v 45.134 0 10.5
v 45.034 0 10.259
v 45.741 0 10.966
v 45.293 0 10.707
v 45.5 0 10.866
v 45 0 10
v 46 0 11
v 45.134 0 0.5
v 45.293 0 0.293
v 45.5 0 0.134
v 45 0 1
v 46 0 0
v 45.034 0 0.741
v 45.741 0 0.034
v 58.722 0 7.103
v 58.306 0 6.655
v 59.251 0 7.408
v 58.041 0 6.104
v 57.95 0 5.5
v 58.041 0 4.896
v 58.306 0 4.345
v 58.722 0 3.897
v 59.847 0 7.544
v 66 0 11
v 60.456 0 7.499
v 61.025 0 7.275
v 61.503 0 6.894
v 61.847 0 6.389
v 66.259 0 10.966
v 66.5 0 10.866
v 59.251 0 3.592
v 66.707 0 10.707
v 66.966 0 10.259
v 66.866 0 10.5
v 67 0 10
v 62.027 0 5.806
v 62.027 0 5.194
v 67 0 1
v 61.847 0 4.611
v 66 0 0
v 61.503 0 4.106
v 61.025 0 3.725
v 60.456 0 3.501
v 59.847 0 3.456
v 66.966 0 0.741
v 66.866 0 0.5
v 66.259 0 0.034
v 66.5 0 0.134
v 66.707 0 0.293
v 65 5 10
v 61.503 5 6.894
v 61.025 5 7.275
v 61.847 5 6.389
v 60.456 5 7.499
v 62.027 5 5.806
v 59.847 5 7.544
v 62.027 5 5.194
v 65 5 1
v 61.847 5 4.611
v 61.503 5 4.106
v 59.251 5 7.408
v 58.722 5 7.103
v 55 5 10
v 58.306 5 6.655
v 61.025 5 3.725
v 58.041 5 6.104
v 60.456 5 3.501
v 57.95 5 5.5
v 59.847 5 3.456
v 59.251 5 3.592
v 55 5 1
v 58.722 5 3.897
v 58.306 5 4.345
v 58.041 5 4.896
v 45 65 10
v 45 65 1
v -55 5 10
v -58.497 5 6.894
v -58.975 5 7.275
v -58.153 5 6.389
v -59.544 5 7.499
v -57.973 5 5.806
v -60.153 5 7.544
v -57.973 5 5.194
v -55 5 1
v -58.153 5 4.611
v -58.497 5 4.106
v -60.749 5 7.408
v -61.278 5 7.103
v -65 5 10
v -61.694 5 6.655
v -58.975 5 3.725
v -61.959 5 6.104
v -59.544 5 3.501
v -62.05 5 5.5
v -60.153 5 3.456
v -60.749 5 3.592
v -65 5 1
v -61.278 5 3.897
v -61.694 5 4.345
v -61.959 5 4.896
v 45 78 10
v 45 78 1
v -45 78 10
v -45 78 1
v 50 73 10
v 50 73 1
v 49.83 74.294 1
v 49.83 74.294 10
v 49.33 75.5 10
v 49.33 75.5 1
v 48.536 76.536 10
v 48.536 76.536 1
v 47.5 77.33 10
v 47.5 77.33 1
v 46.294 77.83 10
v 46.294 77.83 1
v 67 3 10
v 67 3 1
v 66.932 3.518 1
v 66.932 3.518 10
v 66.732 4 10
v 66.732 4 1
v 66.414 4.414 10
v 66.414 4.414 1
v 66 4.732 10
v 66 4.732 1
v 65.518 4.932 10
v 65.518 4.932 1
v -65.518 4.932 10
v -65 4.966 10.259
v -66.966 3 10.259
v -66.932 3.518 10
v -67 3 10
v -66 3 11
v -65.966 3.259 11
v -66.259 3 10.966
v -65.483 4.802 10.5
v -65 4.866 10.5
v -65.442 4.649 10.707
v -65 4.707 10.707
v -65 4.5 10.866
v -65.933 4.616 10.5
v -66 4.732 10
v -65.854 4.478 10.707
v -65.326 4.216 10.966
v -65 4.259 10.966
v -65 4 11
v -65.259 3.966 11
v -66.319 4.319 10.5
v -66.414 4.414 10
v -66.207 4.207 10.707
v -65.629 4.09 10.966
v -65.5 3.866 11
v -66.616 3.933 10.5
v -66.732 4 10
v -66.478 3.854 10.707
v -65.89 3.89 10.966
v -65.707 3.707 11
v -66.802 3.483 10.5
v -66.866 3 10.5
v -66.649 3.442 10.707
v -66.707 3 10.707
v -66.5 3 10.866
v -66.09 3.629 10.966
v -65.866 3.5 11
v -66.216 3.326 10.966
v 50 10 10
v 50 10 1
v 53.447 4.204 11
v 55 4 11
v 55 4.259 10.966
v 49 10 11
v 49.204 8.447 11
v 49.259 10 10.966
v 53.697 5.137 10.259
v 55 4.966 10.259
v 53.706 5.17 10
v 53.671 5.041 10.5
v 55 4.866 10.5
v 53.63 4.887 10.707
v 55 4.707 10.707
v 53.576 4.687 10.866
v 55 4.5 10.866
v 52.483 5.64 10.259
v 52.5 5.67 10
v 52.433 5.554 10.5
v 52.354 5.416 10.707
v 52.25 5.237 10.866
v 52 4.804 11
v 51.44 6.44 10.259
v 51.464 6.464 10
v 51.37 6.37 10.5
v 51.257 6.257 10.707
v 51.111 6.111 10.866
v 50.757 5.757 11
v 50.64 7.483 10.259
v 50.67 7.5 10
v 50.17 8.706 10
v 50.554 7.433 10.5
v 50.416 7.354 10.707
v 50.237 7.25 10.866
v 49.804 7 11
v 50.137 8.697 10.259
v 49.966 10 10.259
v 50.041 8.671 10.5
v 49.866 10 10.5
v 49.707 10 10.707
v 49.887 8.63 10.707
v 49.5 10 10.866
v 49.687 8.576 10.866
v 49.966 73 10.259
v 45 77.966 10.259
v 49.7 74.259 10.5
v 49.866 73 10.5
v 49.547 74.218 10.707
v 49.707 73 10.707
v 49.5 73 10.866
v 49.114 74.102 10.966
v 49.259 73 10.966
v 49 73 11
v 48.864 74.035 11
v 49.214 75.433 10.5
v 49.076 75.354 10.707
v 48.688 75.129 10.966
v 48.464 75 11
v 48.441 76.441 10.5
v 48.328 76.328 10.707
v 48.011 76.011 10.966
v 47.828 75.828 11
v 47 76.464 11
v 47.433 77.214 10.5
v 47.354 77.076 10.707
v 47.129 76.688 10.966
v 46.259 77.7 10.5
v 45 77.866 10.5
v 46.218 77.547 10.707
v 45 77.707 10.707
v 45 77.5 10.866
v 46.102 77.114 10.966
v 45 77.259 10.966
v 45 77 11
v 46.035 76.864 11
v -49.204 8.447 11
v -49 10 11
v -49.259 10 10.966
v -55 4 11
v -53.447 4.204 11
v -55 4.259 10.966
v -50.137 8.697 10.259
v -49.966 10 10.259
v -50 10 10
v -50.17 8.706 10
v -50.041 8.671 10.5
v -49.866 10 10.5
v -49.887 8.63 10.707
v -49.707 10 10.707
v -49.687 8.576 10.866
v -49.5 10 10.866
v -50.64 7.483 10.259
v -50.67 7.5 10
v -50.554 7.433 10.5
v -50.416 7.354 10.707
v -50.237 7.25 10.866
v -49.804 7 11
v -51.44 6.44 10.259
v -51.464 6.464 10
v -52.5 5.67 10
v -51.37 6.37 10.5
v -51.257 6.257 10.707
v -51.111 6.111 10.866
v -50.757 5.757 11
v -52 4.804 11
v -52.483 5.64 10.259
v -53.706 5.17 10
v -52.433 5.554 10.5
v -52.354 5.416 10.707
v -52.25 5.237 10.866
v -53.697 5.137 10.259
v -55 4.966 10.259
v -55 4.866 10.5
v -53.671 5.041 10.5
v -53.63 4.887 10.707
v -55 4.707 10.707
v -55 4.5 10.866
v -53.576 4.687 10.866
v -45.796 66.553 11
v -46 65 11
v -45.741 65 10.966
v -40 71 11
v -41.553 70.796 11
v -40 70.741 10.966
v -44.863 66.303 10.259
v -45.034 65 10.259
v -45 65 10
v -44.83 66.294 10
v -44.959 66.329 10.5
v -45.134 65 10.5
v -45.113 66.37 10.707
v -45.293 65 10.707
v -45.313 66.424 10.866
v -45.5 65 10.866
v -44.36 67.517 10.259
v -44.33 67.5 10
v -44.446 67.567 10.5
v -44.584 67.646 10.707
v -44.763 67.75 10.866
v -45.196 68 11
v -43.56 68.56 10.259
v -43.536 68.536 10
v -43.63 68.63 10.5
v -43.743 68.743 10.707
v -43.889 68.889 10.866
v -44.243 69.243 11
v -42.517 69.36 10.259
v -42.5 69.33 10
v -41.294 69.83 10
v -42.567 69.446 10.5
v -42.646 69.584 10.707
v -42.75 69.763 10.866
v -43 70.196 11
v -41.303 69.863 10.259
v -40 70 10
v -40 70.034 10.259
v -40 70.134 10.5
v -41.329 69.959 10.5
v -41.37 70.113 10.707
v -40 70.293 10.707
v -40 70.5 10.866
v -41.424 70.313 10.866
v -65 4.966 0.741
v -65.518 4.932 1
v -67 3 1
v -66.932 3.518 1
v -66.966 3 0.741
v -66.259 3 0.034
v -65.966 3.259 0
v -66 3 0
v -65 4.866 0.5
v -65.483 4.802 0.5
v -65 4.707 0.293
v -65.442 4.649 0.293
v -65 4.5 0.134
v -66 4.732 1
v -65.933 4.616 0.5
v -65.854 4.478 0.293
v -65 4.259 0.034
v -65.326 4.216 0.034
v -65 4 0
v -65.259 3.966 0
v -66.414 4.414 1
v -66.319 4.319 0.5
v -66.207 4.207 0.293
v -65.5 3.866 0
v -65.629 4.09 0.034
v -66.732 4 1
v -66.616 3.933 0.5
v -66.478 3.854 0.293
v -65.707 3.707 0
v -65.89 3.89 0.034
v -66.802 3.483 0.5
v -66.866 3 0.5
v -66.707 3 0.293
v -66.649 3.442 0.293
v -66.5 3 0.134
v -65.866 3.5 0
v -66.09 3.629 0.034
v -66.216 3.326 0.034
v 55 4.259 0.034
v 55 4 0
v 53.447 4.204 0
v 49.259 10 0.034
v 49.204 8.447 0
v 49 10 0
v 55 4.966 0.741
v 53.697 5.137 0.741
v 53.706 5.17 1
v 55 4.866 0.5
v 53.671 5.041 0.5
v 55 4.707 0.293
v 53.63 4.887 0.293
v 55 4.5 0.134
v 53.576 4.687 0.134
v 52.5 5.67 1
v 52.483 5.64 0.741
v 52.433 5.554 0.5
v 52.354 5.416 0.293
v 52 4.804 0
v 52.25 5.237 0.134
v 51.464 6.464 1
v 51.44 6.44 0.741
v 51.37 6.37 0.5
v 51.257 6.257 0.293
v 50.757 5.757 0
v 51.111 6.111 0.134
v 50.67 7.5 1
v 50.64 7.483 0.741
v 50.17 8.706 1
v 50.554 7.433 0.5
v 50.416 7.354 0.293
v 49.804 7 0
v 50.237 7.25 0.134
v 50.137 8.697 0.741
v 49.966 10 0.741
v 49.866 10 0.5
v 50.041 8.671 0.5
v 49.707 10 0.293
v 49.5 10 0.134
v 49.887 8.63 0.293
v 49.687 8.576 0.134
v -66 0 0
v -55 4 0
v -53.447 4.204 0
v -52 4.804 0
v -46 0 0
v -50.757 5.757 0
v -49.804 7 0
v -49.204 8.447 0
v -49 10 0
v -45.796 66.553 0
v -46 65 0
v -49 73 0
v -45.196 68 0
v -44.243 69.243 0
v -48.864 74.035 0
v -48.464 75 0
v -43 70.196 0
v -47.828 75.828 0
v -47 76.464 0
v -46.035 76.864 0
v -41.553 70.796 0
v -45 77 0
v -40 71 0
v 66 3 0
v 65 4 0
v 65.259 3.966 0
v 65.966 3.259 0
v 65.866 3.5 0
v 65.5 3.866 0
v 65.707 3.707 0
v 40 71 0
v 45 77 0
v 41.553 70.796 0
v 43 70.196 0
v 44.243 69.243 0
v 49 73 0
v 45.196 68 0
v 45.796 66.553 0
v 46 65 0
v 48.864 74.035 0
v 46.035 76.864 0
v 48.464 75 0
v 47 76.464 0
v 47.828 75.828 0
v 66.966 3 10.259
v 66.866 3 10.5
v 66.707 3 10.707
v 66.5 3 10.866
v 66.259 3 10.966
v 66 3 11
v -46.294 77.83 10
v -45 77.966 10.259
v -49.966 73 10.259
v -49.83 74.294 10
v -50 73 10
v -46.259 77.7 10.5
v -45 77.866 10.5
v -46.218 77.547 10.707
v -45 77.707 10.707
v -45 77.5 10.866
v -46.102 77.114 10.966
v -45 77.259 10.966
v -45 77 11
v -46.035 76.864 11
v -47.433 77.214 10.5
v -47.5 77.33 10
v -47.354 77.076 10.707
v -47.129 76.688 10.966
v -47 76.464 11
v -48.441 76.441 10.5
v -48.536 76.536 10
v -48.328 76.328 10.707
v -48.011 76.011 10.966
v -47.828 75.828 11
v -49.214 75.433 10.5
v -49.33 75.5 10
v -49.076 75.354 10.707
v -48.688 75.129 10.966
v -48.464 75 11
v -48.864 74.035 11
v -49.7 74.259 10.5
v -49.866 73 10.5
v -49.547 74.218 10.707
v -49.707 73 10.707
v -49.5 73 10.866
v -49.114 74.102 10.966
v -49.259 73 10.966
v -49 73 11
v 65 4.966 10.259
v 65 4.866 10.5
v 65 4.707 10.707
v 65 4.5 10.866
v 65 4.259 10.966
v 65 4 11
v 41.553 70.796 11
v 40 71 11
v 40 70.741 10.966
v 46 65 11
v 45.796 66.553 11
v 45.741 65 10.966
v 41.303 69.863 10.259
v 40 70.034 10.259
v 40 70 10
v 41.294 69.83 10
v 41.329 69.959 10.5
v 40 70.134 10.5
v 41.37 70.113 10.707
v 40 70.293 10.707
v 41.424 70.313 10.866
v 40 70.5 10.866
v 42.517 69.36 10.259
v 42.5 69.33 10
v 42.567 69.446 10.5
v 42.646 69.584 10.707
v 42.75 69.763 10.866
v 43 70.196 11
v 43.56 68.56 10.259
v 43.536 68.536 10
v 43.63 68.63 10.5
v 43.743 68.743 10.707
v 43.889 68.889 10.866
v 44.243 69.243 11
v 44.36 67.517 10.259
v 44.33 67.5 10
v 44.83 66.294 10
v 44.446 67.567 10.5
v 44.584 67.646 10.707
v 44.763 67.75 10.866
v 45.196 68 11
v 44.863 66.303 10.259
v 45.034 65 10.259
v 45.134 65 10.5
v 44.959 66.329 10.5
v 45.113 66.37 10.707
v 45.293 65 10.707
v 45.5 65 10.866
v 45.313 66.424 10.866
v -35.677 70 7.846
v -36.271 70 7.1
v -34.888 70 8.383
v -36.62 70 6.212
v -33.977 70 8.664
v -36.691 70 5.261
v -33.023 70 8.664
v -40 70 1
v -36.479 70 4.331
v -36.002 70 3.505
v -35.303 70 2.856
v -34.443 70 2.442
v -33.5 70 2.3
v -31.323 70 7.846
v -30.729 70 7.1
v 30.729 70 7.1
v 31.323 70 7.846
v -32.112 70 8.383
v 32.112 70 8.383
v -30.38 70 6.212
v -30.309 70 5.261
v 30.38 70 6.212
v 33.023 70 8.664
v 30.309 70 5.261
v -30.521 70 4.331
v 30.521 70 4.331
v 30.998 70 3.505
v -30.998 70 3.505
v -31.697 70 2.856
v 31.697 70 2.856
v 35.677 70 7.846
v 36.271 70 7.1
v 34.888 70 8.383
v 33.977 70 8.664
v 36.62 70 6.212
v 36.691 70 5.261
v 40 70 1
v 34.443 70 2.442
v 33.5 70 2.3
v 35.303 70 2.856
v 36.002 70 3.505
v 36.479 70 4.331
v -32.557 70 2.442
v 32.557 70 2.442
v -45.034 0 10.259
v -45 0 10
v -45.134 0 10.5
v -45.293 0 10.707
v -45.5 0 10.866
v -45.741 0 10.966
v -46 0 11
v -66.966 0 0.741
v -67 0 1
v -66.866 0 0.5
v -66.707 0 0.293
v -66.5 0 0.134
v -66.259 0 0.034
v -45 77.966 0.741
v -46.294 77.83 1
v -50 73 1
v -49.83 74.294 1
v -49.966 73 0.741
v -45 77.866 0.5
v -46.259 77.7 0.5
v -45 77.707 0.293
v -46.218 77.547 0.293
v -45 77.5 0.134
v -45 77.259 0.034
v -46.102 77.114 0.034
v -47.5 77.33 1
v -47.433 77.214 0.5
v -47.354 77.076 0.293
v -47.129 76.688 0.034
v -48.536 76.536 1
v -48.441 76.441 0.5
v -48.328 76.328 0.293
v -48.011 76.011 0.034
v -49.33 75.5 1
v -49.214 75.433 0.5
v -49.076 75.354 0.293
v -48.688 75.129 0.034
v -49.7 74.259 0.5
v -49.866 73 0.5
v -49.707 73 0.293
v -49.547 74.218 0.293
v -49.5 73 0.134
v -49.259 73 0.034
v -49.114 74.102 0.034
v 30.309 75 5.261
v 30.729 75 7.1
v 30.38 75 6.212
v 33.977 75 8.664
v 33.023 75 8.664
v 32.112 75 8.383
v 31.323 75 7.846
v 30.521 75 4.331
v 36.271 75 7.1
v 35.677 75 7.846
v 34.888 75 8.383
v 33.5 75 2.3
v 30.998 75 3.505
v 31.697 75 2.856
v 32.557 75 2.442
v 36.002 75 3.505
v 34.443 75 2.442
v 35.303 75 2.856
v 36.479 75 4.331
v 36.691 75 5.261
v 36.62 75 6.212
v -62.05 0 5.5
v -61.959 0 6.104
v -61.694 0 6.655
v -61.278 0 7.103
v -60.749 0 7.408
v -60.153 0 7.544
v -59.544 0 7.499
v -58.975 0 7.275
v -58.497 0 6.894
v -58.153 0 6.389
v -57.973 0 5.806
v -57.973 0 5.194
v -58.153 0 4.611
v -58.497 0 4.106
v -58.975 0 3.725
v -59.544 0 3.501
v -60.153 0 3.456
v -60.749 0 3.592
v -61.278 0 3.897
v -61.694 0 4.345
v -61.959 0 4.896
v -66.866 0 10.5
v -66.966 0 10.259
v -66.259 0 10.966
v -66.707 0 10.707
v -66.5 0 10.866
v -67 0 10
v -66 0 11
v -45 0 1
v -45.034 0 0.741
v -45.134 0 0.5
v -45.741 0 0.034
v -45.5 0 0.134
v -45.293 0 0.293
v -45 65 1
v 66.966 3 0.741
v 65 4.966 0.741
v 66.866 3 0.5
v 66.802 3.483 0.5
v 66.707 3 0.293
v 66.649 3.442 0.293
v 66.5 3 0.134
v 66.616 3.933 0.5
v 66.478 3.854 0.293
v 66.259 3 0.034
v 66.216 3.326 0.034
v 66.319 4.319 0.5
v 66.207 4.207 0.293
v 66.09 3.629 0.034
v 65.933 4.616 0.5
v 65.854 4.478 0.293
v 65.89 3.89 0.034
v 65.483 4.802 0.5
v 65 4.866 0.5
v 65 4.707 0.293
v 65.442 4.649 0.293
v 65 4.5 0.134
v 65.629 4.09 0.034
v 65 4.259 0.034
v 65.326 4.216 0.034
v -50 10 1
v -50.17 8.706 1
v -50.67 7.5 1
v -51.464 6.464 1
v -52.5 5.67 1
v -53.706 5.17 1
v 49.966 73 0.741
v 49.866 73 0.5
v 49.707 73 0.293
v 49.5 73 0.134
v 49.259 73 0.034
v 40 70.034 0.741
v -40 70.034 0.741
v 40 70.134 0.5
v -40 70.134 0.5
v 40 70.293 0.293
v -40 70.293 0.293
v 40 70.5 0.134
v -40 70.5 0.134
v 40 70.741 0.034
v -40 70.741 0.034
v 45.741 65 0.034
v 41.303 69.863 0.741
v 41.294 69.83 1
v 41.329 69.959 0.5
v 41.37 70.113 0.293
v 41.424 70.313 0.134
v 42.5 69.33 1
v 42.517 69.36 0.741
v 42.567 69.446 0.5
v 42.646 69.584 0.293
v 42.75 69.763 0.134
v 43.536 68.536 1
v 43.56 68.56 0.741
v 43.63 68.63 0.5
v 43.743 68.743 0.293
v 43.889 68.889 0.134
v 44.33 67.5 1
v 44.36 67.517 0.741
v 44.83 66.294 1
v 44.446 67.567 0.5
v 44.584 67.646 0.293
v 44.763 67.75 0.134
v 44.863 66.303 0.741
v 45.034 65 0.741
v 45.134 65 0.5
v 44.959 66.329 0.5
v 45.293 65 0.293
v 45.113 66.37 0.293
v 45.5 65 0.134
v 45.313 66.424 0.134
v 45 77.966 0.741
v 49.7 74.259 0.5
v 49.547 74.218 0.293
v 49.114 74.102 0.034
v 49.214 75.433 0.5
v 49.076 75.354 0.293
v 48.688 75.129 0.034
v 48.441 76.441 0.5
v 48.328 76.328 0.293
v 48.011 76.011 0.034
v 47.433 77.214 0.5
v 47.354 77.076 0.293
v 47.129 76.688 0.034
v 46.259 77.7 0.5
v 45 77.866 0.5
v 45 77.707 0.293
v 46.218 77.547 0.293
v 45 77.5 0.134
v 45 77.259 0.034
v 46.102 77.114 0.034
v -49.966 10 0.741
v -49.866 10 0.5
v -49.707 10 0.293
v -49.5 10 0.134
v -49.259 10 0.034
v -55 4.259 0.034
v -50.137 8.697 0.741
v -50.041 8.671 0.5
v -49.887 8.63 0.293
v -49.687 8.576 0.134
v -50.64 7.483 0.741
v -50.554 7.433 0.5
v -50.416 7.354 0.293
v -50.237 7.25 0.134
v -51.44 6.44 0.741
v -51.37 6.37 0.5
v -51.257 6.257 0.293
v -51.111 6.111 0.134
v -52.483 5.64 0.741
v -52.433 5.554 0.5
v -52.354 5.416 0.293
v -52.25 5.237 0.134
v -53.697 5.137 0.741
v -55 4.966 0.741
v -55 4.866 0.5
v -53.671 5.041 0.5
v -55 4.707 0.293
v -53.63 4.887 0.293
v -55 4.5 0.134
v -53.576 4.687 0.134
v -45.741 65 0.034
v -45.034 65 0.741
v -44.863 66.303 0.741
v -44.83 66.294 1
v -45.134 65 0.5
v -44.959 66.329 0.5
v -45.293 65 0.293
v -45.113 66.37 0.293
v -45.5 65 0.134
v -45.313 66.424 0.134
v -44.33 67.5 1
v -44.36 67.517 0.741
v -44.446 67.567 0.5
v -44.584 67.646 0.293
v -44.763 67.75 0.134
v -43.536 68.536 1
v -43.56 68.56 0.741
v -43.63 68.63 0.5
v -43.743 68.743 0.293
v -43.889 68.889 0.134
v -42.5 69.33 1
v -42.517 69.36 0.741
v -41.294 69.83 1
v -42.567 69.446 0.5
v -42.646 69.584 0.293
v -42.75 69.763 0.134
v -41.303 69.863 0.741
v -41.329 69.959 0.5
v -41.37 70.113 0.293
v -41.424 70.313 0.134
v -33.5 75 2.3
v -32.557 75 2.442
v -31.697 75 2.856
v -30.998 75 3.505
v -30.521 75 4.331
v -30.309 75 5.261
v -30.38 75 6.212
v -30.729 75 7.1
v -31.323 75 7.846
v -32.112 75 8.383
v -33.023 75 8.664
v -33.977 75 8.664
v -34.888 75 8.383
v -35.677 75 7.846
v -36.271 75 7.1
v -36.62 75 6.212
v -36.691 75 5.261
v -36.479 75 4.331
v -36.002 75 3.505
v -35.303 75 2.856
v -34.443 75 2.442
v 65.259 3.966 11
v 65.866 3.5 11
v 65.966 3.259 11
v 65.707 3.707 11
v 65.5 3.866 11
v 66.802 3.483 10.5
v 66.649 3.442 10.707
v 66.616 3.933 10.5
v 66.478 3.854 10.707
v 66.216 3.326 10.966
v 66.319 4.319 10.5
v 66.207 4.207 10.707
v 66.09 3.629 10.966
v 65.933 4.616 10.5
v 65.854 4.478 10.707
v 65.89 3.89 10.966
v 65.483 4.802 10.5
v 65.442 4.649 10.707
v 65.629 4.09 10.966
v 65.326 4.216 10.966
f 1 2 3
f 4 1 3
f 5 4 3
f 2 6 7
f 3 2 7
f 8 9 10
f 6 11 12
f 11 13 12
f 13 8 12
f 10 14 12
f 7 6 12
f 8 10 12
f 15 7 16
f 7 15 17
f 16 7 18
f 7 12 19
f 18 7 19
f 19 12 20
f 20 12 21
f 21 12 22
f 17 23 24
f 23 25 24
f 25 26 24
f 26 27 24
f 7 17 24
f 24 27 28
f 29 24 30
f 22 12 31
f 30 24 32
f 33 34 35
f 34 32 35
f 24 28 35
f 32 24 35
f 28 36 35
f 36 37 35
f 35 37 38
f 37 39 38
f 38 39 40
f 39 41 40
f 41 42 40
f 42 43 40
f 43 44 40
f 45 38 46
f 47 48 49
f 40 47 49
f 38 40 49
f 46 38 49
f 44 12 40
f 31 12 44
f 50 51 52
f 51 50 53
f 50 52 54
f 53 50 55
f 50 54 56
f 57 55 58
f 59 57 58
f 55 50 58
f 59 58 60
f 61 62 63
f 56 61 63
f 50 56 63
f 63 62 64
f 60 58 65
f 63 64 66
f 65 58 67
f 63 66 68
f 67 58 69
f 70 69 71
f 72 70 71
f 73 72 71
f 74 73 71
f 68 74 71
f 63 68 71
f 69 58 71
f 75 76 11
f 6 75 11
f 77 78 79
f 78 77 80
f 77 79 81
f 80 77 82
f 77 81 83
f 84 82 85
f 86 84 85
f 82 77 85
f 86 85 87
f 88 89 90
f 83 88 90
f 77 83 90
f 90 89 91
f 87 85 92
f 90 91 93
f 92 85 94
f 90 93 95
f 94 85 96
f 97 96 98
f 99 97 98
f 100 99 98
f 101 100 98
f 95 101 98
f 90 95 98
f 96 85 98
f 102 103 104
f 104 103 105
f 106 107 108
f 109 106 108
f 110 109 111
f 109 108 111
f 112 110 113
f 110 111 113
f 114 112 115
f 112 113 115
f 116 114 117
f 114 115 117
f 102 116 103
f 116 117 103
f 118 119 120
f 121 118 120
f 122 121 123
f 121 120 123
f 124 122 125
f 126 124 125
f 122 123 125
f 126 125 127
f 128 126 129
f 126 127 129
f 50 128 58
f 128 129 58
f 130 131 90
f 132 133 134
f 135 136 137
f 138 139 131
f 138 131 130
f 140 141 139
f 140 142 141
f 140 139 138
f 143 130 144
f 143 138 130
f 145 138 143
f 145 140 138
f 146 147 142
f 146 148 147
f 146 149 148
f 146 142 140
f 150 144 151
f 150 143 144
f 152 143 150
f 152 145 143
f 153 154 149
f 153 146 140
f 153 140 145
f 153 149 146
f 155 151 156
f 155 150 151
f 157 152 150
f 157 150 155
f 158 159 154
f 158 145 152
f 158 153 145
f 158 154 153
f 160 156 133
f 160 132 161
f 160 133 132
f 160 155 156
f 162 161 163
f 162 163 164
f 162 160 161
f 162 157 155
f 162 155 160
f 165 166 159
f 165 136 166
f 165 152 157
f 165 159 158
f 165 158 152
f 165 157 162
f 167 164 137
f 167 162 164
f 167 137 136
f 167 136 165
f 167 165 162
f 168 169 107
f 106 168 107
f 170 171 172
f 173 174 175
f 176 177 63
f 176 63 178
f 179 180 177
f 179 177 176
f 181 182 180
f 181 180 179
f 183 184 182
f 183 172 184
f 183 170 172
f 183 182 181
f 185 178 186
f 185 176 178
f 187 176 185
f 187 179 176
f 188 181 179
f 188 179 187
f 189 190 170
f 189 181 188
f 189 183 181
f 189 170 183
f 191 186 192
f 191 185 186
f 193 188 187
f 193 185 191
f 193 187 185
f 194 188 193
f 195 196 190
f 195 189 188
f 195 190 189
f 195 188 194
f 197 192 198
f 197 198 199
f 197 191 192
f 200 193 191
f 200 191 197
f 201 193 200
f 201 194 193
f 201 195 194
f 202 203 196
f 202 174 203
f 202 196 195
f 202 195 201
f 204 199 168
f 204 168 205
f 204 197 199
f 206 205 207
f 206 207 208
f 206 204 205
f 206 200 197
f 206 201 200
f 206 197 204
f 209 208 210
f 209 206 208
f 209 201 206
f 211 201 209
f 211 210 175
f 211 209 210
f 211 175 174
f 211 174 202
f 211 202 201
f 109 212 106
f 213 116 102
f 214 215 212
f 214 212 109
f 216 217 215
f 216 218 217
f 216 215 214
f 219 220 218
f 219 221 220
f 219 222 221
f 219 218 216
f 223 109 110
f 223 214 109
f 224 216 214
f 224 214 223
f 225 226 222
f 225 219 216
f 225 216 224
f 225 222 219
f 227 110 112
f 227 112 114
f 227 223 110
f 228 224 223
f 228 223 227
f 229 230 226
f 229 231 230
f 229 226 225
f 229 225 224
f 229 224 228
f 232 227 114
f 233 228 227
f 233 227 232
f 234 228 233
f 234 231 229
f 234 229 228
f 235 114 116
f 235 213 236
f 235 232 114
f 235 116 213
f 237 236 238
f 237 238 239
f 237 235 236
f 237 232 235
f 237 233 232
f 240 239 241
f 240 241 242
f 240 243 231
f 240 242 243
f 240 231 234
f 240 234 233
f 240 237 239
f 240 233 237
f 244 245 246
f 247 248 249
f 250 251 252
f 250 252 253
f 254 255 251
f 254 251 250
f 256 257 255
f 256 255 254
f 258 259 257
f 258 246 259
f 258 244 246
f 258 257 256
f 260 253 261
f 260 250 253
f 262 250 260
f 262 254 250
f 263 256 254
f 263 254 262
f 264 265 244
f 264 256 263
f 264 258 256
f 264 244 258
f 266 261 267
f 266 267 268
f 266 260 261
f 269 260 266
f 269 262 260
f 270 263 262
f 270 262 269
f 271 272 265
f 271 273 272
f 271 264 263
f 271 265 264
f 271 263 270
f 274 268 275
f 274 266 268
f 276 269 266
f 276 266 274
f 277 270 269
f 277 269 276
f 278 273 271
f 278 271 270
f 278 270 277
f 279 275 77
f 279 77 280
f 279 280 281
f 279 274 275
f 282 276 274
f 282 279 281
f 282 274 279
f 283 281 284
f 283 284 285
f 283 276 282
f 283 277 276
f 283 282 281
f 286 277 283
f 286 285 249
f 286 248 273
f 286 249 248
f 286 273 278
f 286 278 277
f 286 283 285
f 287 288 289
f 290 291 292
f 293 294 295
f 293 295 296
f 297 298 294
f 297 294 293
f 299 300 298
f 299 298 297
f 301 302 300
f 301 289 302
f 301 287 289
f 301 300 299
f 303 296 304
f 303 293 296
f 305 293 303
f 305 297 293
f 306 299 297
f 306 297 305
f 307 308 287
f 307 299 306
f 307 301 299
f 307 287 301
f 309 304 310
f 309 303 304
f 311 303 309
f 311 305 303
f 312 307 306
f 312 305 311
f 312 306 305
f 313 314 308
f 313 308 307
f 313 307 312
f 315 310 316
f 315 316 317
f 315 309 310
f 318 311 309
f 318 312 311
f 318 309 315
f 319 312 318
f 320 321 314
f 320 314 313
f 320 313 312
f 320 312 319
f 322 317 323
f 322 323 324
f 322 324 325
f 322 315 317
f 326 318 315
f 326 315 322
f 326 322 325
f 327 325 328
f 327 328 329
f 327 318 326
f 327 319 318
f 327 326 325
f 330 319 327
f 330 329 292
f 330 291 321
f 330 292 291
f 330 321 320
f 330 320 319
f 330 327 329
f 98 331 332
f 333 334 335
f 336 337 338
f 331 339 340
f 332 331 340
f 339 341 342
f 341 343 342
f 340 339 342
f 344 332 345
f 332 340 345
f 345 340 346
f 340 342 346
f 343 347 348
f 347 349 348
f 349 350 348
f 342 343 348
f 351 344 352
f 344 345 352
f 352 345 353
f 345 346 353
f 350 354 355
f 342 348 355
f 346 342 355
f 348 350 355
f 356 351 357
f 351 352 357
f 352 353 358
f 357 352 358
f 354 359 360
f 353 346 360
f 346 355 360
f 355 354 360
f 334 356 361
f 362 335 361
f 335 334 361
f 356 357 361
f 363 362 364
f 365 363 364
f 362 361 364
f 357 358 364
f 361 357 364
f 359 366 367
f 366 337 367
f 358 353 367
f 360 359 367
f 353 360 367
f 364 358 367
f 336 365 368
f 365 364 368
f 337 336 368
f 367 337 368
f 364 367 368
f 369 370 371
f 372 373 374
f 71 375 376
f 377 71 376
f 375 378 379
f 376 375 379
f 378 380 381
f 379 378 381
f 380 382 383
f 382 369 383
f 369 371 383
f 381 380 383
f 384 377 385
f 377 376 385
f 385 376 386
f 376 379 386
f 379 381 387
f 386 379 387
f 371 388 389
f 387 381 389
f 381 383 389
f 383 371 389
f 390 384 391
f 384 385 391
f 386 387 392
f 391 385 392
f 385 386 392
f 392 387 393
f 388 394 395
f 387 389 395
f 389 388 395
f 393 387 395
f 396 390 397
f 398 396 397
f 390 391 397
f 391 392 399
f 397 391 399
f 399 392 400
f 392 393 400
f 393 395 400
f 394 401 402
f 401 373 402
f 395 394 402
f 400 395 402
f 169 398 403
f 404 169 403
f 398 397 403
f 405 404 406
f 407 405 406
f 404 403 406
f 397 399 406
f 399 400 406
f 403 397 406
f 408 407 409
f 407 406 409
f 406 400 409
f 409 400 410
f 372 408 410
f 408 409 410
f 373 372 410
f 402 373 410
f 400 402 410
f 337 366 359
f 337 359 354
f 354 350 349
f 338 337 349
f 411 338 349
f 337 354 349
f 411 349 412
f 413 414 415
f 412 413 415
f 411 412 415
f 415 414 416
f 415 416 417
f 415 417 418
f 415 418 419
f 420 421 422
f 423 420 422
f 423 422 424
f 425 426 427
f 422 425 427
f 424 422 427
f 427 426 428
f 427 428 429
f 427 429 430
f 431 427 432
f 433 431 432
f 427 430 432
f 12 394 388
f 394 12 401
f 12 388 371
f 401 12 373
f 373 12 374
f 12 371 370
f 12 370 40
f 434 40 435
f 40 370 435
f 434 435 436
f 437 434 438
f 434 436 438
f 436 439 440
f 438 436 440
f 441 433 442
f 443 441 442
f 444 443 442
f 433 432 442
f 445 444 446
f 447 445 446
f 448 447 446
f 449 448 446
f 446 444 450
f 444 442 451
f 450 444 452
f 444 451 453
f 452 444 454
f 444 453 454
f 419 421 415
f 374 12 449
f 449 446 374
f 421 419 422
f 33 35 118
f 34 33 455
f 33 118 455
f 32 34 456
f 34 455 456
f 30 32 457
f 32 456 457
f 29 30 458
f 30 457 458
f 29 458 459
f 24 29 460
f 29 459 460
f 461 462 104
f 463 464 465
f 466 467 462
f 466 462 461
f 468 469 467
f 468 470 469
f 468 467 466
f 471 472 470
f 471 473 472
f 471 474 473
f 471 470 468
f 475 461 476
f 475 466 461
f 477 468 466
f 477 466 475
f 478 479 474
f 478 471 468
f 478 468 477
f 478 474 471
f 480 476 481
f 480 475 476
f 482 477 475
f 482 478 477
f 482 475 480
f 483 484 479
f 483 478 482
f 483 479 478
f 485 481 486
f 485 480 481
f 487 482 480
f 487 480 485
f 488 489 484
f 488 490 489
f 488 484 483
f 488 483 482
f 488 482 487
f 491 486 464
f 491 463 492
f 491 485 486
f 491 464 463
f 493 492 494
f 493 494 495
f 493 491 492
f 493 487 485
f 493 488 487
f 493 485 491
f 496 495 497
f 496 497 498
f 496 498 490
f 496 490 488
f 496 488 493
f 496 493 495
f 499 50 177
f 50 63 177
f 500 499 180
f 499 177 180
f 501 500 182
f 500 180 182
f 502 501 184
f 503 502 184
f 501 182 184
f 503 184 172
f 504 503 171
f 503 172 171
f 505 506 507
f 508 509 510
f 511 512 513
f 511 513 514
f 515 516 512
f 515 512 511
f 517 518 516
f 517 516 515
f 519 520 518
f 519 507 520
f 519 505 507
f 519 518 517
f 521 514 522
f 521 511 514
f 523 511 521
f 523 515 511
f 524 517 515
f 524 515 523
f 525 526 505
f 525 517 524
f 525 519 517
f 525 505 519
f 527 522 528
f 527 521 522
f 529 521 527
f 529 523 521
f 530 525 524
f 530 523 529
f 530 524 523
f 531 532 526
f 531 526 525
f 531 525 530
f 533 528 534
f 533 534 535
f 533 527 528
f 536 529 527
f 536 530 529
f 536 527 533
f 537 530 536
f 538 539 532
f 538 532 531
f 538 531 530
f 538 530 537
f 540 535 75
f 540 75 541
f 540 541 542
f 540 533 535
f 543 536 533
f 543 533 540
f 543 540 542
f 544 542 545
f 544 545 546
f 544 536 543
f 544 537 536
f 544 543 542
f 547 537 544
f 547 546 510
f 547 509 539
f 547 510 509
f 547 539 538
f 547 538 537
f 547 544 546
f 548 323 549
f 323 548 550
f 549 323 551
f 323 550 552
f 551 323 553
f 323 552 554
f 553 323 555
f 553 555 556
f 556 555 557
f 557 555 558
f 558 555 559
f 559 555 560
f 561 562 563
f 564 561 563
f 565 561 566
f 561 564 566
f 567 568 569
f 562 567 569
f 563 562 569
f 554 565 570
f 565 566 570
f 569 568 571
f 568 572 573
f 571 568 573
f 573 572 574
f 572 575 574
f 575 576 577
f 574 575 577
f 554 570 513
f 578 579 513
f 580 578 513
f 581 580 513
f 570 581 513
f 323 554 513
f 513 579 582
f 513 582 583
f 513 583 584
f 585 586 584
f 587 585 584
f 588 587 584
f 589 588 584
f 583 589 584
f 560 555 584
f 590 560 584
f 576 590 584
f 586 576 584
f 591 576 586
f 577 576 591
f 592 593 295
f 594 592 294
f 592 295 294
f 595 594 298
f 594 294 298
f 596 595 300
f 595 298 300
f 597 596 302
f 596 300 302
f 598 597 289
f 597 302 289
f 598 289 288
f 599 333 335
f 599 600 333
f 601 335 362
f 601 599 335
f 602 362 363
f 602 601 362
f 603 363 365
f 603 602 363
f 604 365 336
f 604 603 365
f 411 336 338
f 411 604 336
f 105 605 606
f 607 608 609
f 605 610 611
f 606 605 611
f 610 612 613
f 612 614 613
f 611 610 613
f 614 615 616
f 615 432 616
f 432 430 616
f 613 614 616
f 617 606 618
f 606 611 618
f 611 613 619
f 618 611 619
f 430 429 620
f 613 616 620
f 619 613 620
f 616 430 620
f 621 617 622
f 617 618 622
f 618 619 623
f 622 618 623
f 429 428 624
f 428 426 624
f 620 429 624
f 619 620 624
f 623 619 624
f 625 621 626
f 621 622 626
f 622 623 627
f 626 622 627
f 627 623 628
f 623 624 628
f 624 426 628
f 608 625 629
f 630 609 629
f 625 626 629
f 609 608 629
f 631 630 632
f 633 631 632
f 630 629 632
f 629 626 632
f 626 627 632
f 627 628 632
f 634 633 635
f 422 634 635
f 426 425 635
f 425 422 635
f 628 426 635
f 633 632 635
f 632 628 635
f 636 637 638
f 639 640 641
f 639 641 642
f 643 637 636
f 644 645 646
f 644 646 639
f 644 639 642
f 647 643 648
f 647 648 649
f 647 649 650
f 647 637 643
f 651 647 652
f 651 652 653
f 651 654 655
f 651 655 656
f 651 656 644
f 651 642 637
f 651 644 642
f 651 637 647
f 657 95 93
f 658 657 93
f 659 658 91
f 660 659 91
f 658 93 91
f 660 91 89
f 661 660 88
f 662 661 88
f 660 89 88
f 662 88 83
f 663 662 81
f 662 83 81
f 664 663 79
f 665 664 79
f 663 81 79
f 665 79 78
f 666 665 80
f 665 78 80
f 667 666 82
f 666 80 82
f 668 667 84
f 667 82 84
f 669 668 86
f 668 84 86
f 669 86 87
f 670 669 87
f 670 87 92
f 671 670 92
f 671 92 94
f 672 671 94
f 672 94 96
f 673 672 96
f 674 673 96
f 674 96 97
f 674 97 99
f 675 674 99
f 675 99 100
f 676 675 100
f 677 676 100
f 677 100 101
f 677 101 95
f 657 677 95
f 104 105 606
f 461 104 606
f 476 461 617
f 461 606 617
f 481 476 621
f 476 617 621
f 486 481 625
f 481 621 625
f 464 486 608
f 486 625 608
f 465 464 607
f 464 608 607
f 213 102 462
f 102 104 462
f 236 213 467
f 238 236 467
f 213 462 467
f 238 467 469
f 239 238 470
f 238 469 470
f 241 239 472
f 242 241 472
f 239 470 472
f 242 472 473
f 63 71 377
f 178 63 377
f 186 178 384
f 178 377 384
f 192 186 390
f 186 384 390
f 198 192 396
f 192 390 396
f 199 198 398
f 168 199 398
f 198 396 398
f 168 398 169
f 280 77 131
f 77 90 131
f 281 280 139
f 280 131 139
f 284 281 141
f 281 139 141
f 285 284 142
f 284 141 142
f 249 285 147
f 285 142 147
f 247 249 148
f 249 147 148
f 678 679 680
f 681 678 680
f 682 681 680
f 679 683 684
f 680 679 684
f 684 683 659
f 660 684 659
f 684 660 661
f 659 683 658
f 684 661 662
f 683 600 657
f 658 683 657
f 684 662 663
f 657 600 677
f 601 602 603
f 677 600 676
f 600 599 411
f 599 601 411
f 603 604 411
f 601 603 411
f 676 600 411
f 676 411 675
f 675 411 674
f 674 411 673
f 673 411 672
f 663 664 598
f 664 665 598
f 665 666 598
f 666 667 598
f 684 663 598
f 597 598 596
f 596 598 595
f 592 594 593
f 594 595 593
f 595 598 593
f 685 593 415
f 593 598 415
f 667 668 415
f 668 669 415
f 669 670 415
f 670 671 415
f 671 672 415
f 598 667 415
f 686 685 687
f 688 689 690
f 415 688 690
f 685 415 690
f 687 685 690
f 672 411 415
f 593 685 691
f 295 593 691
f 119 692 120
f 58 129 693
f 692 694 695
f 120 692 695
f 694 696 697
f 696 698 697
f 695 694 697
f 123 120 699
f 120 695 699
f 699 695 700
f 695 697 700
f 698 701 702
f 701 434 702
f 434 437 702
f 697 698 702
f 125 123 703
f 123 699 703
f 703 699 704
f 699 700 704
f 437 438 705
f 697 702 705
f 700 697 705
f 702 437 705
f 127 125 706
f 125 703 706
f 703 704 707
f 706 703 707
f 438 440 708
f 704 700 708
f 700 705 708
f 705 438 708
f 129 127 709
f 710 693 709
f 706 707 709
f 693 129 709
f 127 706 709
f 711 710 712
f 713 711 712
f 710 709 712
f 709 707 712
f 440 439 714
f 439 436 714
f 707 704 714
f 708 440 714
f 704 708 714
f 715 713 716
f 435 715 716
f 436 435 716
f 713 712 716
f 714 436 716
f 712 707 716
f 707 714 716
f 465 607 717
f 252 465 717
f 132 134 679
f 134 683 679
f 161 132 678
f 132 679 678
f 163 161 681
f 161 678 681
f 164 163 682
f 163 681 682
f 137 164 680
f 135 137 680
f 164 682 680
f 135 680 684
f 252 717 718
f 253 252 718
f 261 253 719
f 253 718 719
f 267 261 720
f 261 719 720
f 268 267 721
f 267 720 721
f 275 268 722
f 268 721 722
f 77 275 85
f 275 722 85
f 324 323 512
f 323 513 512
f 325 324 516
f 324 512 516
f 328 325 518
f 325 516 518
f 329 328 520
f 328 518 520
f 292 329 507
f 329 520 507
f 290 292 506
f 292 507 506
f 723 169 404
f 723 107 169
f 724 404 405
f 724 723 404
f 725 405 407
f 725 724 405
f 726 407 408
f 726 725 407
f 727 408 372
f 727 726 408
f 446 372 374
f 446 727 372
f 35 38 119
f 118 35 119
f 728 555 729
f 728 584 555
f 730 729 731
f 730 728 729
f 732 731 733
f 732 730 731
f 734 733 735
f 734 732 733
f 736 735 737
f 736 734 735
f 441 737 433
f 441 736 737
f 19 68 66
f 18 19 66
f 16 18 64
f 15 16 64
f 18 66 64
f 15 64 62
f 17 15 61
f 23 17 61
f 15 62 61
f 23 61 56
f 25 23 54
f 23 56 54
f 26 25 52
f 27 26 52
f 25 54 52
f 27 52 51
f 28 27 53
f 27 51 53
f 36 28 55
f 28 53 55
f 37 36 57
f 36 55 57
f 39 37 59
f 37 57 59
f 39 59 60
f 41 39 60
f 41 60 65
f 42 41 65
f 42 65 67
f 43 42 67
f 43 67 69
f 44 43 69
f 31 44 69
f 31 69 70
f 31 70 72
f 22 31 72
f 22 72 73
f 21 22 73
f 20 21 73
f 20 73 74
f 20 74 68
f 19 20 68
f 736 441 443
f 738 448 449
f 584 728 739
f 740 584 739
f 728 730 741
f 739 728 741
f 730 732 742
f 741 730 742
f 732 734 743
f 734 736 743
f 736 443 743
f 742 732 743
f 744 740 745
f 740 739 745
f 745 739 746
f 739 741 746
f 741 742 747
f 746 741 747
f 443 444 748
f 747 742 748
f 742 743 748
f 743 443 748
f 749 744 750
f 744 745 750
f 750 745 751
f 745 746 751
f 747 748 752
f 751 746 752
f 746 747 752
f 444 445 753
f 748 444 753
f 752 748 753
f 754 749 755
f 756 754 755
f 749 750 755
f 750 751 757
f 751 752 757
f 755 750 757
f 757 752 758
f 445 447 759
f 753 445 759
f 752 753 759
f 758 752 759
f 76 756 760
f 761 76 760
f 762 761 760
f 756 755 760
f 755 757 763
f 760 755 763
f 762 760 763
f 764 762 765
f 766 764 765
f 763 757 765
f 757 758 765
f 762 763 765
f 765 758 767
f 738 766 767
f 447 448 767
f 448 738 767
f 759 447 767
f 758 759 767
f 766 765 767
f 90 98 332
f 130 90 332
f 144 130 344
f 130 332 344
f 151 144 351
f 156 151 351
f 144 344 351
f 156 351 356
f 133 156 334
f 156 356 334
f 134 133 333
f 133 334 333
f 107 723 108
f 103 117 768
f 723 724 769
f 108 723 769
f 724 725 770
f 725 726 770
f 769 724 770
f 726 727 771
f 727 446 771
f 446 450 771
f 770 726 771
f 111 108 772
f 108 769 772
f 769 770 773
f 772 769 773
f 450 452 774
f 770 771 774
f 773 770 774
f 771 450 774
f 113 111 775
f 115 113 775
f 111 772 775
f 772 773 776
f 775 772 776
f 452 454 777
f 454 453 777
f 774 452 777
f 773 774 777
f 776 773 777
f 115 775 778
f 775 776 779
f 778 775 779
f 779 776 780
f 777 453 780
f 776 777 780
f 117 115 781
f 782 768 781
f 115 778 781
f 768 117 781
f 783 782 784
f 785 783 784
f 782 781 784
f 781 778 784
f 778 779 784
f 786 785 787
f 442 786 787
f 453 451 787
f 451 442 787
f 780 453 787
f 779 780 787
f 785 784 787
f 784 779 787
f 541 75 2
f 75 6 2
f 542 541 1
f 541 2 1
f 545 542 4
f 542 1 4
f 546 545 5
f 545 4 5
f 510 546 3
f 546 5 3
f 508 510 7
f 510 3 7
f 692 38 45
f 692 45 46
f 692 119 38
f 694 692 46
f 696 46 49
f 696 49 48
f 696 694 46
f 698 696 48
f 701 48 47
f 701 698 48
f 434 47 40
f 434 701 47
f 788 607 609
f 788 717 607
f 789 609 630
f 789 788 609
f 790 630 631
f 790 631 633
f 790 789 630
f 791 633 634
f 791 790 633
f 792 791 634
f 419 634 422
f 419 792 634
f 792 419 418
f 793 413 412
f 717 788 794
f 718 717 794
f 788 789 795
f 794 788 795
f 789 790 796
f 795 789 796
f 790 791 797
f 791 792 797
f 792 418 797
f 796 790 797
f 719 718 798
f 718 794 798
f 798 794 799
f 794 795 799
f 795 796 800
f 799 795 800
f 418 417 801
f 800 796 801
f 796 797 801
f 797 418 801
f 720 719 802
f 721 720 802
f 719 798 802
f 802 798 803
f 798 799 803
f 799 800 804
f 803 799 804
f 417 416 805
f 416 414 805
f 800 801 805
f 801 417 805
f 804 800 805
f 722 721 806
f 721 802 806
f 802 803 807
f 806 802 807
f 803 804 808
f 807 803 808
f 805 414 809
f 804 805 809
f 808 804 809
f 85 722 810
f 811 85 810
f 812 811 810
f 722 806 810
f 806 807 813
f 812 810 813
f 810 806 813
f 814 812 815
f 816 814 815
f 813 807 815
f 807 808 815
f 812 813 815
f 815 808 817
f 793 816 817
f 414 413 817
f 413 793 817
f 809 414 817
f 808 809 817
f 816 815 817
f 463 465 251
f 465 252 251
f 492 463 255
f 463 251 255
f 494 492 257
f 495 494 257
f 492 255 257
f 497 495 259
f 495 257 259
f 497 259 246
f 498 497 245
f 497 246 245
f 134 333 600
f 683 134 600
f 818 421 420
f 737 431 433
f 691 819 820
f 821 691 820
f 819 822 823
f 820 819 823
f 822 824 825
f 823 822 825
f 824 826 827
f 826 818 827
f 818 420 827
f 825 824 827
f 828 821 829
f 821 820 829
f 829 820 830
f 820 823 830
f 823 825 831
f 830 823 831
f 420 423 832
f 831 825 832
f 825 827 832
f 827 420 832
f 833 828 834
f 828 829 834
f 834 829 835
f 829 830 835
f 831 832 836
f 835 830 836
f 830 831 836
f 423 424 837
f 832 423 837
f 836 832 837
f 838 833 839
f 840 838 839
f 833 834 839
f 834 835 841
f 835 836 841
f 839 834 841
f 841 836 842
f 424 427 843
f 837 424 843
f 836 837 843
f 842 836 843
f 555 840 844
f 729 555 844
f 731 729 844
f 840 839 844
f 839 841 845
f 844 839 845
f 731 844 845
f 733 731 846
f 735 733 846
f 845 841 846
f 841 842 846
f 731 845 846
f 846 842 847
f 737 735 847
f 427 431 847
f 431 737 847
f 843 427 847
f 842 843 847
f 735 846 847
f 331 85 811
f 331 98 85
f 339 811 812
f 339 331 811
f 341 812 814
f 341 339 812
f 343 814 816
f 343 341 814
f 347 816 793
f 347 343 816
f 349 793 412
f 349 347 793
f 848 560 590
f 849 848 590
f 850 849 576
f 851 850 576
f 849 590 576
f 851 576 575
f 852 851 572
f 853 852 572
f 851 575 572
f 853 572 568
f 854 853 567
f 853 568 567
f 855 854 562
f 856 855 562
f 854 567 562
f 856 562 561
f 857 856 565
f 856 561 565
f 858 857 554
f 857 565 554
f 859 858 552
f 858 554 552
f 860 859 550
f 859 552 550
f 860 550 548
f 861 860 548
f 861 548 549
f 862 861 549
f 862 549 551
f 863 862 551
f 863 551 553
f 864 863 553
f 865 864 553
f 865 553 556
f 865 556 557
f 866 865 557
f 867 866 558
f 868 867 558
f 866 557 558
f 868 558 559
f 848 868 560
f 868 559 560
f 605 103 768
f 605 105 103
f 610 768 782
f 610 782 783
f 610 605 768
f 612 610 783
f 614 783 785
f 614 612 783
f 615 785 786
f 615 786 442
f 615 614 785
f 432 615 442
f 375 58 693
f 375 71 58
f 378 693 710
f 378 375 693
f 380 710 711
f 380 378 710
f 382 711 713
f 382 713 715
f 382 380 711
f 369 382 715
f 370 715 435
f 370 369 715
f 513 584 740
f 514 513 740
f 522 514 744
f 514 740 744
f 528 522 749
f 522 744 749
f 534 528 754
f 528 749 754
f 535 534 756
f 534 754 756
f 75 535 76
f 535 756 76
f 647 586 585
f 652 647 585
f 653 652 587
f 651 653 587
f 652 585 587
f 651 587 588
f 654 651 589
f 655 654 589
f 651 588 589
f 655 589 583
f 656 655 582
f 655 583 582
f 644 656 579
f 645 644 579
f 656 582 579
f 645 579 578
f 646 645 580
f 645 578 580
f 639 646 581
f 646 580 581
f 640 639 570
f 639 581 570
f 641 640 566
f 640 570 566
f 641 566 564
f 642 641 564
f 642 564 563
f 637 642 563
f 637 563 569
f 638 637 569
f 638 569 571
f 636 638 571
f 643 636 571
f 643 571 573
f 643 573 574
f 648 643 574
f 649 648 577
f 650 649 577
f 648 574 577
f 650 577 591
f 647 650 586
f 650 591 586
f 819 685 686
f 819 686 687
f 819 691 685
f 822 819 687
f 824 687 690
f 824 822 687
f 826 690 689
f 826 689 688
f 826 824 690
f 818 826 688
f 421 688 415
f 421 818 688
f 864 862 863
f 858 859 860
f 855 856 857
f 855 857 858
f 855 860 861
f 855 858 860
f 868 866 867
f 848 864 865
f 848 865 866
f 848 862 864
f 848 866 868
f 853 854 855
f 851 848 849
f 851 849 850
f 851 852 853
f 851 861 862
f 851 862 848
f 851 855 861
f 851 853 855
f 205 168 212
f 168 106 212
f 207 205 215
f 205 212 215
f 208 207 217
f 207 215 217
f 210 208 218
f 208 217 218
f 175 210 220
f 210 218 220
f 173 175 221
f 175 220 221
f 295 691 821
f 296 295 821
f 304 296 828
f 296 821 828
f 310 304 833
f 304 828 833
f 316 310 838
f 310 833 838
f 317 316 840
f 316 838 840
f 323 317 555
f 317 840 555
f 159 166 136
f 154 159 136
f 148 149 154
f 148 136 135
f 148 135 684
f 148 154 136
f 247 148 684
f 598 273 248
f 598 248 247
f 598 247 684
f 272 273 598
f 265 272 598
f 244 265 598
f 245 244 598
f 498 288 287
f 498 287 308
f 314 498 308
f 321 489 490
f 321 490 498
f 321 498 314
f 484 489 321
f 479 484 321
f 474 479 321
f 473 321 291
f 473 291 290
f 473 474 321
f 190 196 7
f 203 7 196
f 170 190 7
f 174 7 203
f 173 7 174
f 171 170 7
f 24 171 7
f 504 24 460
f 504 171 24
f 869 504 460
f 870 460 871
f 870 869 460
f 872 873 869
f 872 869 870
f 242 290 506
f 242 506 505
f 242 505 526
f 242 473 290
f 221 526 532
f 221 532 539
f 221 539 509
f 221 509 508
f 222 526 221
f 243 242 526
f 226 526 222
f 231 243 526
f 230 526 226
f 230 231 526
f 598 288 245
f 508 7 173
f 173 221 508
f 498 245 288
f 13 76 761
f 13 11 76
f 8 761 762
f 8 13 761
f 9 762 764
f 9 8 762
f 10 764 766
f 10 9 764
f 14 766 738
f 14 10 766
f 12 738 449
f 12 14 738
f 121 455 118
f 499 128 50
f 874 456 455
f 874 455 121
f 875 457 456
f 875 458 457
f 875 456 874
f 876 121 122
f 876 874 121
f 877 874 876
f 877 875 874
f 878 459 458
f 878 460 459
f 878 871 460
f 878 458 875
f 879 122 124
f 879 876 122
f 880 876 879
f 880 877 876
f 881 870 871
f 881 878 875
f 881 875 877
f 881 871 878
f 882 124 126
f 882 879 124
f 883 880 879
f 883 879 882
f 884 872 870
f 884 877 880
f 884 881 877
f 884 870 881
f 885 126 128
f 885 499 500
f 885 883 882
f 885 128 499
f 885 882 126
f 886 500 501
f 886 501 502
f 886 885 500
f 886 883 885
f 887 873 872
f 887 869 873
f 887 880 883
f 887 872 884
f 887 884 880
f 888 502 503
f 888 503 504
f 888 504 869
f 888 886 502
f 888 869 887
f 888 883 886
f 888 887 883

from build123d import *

# Parameters (mm, degrees)
BOSS_EXTRU_1_DEPTH      = 11
CONG_1_R                = 1
ESQUISSE2_R             = 3.2
ENL_V_MAT_EXTRU_1_DEPTH = 5
ESQUISSE3_R             = 2.05
ENL_V_MAT_EXTRU_2_DEPTH = 100.694533451


with BuildPart() as part:
    # Esquisse1 → Boss.-Extru.1 (new body)
    with BuildSketch(Plane.XY):
        with BuildLine():
            Line((-67, 0), (-45, 0))
            Line((-45, 0), (-45, 65))
            ThreePointArc((-45, 65), (-43.535533906, 68.535533906), (-40, 70))
            Line((-40, 70), (40, 70))
            ThreePointArc((40, 70), (43.535533906, 68.535533906), (45, 65))
            Line((45, 65), (45, 0))
            Line((45, 0), (67, 0))
            Line((67, 0), (67, 3))
            ThreePointArc((67, 3), (66.414213562, 4.414213562), (65, 5))
            Line((65, 5), (55, 5))
            ThreePointArc((55, 5), (51.464466094, 6.464466094), (50, 10))
            Line((50, 10), (50, 73))
            ThreePointArc((50, 73), (48.535533906, 76.535533906), (45, 78))
            Line((45, 78), (-45, 78))
            ThreePointArc((-45, 78), (-48.535533906, 76.535533906), (-50, 73))
            Line((-50, 73), (-50, 10))
            ThreePointArc((-50, 10), (-51.464466094, 6.464466094), (-55, 5))
            Line((-55, 5), (-65, 5))
            ThreePointArc((-65, 5), (-66.414213562, 4.414213562), (-67, 3))
            Line((-67, 3), (-67, 0))
        make_face()
    extrude(amount=BOSS_EXTRU_1_DEPTH)

    # Congé1
    cong_1_edges = [part.edges().sort_by_distance(p)[0] for p in [
        (-66.414213562, 4.414213562, 11),
        (-67, 1.5, 11),
        (-50, 41.5, 0),
        (-48.535533906, 76.535533906, 0),
        (0, 78, 0),
        (48.535533906, 76.535533906, 0),
        (50, 41.5, 0),
        (51.464466094, 6.464466094, 0),
        (60, 5, 0),
        (66.414213562, 4.414213562, 0),
        (67, 1.5, 0),
        (45, 32.5, 0),
        (43.535533906, 68.535533906, 0),
        (0, 70, 0),
        (-43.535533906, 68.535533906, 0),
        (-45, 32.5, 11),
        (-45, 32.5, 0),
        (-67, 1.5, 0),
        (-66.414213562, 4.414213562, 0),
        (-60, 5, 0),
        (-51.464466094, 6.464466094, 0),
        (-43.535533906, 68.535533906, 11),
        (0, 70, 11),
        (43.535533906, 68.535533906, 11),
        (45, 32.5, 11),
        (67, 1.5, 11),
        (-51.464466094, 6.464466094, 11),
        (66.414213562, 4.414213562, 11),
        (60, 5, 11),
        (51.464466094, 6.464466094, 11),
        (50, 41.5, 11),
        (48.535533906, 76.535533906, 11),
        (0, 78, 11),
        (-48.535533906, 76.535533906, 11),
        (-50, 41.5, 11),
        (-60, 5, 11),
    ]]
    fillet(cong_1_edges, radius=CONG_1_R)

    # Esquisse2 → Enlèv. mat.-Extru.1 (cut)
    with BuildSketch(Plane.XZ.offset(-70)):
        with Locations(Location((-33.5, 5.5, 0), (0, 0, 270))):
            Circle(ESQUISSE2_R)
        with Locations(Location((33.5, 5.5, 0), (0, 0, 270))):
            Circle(ESQUISSE2_R)
    extrude(amount=-ENL_V_MAT_EXTRU_1_DEPTH, mode=Mode.SUBTRACT)

    # Esquisse3 → Enlèv. mat.-Extru.2 (cut, through all)
    with BuildSketch(Plane(origin=(0, 5, 0), x_dir=(1, 0, 0), z_dir=(0, 1, 0))):
        with Locations(Location((-60, -5.5, 0), (0, 0, 180))):
            Circle(ESQUISSE3_R)
        with Locations(Location((60, -5.5, 0), (0, 0, 180))):
            Circle(ESQUISSE3_R)
    extrude(amount=-ENL_V_MAT_EXTRU_2_DEPTH, mode=Mode.SUBTRACT)


solid = part.part
